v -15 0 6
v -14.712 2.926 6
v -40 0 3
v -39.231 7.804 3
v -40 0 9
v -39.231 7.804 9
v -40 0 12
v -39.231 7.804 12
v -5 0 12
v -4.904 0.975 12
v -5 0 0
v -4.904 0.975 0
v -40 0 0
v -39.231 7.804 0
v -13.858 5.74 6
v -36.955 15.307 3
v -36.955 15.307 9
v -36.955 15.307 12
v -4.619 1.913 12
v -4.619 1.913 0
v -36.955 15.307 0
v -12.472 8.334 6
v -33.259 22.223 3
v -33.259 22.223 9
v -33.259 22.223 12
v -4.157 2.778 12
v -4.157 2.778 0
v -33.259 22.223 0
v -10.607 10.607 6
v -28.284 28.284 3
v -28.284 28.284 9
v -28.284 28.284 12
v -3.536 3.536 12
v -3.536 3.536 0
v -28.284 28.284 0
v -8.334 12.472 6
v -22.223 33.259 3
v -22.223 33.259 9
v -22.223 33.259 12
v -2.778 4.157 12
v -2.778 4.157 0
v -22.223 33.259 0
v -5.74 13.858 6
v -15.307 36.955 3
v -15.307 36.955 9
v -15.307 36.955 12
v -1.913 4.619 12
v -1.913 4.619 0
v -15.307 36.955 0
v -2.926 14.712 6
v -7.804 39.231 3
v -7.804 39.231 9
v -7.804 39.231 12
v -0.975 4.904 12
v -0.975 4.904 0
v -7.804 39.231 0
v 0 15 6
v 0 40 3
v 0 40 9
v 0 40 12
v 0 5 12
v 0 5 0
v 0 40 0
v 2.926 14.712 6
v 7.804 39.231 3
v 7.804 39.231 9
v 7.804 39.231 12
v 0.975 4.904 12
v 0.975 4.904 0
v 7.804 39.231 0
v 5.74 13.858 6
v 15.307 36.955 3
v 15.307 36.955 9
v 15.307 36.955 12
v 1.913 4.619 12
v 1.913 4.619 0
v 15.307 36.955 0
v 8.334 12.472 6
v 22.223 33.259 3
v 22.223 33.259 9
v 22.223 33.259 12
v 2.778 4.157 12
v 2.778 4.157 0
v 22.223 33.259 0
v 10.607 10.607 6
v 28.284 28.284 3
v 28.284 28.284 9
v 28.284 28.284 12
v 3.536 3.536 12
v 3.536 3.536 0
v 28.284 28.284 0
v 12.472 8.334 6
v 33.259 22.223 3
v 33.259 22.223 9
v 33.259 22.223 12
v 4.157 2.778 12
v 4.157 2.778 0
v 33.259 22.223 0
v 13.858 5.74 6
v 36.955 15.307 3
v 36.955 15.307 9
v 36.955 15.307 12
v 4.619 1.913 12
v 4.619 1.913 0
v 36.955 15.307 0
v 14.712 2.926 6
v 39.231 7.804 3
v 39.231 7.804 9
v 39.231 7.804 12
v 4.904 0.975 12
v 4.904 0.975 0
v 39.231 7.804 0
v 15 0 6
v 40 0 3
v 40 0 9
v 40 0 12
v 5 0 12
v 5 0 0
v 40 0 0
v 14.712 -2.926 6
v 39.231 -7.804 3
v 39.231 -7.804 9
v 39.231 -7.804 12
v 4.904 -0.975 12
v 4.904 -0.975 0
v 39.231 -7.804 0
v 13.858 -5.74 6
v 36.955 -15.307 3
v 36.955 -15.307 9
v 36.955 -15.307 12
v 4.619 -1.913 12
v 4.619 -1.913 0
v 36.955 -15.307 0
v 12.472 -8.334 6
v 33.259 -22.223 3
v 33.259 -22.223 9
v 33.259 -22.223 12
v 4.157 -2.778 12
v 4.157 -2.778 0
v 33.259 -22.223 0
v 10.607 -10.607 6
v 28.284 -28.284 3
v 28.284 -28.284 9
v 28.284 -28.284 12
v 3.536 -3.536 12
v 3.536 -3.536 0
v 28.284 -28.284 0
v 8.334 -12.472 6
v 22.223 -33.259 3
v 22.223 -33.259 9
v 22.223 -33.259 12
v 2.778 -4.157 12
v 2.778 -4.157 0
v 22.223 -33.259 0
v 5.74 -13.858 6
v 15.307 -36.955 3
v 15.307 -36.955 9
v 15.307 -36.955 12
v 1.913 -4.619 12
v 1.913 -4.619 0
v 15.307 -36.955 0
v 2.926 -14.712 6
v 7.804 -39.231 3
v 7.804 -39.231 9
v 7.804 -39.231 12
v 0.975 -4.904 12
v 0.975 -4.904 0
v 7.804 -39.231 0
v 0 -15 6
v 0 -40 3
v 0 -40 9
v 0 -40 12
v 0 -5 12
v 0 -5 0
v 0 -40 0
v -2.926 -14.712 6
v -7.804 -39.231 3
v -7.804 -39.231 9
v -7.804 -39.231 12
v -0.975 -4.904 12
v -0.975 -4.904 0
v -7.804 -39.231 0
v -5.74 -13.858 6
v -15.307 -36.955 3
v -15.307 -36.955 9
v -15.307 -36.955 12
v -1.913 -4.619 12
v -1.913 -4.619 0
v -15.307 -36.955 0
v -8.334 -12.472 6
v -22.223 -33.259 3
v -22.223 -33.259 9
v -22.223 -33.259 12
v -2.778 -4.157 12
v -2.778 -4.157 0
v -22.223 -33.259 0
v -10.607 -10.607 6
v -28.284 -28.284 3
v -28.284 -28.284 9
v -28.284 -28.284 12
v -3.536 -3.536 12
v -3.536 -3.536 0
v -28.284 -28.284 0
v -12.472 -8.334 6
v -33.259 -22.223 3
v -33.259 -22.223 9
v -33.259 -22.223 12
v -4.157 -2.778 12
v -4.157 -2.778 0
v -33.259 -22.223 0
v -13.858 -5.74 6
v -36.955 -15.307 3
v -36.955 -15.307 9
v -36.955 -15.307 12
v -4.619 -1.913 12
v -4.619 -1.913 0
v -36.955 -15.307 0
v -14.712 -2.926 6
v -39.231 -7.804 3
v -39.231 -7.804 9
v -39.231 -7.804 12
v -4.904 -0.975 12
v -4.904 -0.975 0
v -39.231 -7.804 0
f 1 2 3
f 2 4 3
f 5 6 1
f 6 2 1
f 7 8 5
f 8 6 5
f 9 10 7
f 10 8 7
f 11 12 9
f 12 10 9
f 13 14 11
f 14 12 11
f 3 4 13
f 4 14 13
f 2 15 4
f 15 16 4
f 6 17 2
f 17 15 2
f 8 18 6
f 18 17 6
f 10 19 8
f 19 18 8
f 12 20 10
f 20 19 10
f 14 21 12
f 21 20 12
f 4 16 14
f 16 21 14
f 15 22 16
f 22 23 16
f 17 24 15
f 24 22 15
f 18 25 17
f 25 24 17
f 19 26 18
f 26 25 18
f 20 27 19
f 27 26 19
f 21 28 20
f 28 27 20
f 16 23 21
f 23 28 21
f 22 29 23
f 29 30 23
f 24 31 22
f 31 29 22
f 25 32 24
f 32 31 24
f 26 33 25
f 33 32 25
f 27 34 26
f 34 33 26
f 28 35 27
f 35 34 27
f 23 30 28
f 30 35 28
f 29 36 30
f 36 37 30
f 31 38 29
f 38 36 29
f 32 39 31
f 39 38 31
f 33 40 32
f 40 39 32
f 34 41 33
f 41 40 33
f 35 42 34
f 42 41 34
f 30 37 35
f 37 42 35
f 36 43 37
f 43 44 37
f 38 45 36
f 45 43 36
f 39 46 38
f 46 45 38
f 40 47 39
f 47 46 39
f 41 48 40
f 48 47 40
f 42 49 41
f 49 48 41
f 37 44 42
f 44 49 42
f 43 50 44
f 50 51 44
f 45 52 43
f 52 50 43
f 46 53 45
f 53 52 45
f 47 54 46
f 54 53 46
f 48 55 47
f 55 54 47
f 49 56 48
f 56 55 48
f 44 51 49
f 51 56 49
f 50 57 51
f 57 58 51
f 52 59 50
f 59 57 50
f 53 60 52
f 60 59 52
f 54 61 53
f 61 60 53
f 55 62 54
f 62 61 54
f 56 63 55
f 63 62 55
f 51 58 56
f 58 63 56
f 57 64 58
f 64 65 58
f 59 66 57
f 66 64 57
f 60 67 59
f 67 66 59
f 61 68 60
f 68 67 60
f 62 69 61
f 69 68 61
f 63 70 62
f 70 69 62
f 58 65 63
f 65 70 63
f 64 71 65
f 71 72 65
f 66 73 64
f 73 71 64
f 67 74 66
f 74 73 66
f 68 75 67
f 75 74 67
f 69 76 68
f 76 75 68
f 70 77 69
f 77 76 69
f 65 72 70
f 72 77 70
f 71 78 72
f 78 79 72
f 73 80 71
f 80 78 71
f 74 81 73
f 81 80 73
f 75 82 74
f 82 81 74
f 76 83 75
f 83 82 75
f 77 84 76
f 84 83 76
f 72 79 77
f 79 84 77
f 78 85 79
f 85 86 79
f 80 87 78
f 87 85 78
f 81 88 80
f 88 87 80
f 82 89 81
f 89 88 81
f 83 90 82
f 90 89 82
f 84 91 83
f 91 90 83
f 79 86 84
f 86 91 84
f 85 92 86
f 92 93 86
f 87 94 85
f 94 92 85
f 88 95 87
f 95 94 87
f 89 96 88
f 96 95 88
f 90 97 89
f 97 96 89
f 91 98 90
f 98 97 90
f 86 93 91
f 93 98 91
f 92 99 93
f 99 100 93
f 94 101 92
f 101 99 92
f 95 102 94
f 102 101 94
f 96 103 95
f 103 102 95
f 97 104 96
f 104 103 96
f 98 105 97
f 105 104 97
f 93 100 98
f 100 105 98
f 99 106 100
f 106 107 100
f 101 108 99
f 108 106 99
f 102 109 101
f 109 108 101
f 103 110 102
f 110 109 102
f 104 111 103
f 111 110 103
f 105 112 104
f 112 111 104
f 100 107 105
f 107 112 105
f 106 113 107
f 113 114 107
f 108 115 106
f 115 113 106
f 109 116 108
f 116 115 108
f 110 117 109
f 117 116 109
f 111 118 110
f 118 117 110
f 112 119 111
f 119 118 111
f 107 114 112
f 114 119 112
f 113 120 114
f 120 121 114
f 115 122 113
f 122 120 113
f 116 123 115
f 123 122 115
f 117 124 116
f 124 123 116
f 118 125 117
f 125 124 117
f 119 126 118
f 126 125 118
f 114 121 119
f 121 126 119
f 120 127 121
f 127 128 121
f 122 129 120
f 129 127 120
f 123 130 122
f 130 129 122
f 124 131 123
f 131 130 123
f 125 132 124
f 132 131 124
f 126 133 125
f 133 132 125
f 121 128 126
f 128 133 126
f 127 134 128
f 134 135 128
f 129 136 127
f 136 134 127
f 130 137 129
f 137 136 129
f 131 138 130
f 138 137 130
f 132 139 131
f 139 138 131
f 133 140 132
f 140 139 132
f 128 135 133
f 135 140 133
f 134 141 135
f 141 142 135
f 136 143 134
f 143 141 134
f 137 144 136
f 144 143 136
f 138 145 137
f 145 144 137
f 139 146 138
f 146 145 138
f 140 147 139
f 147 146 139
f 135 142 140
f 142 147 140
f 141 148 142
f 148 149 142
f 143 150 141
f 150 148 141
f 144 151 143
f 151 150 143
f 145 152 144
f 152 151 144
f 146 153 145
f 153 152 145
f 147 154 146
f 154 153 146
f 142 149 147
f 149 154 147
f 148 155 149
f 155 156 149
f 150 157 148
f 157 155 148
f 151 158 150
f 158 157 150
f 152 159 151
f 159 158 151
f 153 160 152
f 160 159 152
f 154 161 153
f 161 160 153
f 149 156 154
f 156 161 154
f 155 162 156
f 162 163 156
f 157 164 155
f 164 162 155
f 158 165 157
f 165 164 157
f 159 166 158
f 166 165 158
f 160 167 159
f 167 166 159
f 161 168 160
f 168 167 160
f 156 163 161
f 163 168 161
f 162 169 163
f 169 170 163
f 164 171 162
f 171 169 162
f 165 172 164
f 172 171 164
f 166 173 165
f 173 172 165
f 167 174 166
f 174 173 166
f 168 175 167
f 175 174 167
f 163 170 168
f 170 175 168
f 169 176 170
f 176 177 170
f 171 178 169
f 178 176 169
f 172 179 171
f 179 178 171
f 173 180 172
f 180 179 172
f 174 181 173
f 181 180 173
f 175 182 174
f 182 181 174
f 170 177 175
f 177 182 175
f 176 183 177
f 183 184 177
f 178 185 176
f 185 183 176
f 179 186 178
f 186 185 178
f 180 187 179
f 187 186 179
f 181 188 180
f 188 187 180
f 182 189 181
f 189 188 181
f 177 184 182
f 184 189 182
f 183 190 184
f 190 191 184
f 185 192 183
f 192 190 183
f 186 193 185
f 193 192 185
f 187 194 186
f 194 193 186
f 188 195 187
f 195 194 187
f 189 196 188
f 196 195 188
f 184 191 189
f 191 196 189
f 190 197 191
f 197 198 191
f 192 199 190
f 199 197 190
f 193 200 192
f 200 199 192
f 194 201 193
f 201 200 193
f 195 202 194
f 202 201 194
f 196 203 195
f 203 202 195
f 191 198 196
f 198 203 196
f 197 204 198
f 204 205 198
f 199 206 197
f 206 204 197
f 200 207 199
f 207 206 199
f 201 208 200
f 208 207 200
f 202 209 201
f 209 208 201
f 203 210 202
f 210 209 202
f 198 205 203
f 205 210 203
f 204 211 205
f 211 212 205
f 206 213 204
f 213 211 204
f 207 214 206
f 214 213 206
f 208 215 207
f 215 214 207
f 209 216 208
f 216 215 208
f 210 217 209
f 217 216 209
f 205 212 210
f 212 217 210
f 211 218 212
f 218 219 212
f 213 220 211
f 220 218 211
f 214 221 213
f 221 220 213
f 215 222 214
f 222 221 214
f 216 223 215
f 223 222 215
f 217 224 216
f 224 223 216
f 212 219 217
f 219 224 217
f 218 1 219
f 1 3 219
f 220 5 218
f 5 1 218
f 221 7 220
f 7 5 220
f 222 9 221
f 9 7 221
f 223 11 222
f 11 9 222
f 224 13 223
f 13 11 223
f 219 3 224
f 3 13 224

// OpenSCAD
$fn = 32;

// ----------------------------------------------------------------------
// Revolved part: V-groove pulley R40
// ----------------------------------------------------------------------

// --- parameters (mm) ---
bore_r = 5;               // bore radius
rim_r = 40;               // rim radius
rim_t = 12;               // rim width
groove_r = 15;            // groove root radius
groove_w = 3;             // groove half width
revolve_angle = 360;      // revolve sweep, degrees
fit_tol = 0.1;            // declared fit tolerance (prompt contract)
free_tol = 0.5;           // declared free tolerance (prompt contract)

bore_d = 2 * bore_r;
rim_d = 2 * rim_r;
groove_d = 2 * groove_r;

profile = [[5, 0], [40, 0], [40, 3], [15, 6], [40, 9], [40, 12], [5, 12]];  // primary outline, 7 points, counter clockwise

// --- the one profile operation ---
rotate_extrude(angle = revolve_angle) polygon(points = profile);
